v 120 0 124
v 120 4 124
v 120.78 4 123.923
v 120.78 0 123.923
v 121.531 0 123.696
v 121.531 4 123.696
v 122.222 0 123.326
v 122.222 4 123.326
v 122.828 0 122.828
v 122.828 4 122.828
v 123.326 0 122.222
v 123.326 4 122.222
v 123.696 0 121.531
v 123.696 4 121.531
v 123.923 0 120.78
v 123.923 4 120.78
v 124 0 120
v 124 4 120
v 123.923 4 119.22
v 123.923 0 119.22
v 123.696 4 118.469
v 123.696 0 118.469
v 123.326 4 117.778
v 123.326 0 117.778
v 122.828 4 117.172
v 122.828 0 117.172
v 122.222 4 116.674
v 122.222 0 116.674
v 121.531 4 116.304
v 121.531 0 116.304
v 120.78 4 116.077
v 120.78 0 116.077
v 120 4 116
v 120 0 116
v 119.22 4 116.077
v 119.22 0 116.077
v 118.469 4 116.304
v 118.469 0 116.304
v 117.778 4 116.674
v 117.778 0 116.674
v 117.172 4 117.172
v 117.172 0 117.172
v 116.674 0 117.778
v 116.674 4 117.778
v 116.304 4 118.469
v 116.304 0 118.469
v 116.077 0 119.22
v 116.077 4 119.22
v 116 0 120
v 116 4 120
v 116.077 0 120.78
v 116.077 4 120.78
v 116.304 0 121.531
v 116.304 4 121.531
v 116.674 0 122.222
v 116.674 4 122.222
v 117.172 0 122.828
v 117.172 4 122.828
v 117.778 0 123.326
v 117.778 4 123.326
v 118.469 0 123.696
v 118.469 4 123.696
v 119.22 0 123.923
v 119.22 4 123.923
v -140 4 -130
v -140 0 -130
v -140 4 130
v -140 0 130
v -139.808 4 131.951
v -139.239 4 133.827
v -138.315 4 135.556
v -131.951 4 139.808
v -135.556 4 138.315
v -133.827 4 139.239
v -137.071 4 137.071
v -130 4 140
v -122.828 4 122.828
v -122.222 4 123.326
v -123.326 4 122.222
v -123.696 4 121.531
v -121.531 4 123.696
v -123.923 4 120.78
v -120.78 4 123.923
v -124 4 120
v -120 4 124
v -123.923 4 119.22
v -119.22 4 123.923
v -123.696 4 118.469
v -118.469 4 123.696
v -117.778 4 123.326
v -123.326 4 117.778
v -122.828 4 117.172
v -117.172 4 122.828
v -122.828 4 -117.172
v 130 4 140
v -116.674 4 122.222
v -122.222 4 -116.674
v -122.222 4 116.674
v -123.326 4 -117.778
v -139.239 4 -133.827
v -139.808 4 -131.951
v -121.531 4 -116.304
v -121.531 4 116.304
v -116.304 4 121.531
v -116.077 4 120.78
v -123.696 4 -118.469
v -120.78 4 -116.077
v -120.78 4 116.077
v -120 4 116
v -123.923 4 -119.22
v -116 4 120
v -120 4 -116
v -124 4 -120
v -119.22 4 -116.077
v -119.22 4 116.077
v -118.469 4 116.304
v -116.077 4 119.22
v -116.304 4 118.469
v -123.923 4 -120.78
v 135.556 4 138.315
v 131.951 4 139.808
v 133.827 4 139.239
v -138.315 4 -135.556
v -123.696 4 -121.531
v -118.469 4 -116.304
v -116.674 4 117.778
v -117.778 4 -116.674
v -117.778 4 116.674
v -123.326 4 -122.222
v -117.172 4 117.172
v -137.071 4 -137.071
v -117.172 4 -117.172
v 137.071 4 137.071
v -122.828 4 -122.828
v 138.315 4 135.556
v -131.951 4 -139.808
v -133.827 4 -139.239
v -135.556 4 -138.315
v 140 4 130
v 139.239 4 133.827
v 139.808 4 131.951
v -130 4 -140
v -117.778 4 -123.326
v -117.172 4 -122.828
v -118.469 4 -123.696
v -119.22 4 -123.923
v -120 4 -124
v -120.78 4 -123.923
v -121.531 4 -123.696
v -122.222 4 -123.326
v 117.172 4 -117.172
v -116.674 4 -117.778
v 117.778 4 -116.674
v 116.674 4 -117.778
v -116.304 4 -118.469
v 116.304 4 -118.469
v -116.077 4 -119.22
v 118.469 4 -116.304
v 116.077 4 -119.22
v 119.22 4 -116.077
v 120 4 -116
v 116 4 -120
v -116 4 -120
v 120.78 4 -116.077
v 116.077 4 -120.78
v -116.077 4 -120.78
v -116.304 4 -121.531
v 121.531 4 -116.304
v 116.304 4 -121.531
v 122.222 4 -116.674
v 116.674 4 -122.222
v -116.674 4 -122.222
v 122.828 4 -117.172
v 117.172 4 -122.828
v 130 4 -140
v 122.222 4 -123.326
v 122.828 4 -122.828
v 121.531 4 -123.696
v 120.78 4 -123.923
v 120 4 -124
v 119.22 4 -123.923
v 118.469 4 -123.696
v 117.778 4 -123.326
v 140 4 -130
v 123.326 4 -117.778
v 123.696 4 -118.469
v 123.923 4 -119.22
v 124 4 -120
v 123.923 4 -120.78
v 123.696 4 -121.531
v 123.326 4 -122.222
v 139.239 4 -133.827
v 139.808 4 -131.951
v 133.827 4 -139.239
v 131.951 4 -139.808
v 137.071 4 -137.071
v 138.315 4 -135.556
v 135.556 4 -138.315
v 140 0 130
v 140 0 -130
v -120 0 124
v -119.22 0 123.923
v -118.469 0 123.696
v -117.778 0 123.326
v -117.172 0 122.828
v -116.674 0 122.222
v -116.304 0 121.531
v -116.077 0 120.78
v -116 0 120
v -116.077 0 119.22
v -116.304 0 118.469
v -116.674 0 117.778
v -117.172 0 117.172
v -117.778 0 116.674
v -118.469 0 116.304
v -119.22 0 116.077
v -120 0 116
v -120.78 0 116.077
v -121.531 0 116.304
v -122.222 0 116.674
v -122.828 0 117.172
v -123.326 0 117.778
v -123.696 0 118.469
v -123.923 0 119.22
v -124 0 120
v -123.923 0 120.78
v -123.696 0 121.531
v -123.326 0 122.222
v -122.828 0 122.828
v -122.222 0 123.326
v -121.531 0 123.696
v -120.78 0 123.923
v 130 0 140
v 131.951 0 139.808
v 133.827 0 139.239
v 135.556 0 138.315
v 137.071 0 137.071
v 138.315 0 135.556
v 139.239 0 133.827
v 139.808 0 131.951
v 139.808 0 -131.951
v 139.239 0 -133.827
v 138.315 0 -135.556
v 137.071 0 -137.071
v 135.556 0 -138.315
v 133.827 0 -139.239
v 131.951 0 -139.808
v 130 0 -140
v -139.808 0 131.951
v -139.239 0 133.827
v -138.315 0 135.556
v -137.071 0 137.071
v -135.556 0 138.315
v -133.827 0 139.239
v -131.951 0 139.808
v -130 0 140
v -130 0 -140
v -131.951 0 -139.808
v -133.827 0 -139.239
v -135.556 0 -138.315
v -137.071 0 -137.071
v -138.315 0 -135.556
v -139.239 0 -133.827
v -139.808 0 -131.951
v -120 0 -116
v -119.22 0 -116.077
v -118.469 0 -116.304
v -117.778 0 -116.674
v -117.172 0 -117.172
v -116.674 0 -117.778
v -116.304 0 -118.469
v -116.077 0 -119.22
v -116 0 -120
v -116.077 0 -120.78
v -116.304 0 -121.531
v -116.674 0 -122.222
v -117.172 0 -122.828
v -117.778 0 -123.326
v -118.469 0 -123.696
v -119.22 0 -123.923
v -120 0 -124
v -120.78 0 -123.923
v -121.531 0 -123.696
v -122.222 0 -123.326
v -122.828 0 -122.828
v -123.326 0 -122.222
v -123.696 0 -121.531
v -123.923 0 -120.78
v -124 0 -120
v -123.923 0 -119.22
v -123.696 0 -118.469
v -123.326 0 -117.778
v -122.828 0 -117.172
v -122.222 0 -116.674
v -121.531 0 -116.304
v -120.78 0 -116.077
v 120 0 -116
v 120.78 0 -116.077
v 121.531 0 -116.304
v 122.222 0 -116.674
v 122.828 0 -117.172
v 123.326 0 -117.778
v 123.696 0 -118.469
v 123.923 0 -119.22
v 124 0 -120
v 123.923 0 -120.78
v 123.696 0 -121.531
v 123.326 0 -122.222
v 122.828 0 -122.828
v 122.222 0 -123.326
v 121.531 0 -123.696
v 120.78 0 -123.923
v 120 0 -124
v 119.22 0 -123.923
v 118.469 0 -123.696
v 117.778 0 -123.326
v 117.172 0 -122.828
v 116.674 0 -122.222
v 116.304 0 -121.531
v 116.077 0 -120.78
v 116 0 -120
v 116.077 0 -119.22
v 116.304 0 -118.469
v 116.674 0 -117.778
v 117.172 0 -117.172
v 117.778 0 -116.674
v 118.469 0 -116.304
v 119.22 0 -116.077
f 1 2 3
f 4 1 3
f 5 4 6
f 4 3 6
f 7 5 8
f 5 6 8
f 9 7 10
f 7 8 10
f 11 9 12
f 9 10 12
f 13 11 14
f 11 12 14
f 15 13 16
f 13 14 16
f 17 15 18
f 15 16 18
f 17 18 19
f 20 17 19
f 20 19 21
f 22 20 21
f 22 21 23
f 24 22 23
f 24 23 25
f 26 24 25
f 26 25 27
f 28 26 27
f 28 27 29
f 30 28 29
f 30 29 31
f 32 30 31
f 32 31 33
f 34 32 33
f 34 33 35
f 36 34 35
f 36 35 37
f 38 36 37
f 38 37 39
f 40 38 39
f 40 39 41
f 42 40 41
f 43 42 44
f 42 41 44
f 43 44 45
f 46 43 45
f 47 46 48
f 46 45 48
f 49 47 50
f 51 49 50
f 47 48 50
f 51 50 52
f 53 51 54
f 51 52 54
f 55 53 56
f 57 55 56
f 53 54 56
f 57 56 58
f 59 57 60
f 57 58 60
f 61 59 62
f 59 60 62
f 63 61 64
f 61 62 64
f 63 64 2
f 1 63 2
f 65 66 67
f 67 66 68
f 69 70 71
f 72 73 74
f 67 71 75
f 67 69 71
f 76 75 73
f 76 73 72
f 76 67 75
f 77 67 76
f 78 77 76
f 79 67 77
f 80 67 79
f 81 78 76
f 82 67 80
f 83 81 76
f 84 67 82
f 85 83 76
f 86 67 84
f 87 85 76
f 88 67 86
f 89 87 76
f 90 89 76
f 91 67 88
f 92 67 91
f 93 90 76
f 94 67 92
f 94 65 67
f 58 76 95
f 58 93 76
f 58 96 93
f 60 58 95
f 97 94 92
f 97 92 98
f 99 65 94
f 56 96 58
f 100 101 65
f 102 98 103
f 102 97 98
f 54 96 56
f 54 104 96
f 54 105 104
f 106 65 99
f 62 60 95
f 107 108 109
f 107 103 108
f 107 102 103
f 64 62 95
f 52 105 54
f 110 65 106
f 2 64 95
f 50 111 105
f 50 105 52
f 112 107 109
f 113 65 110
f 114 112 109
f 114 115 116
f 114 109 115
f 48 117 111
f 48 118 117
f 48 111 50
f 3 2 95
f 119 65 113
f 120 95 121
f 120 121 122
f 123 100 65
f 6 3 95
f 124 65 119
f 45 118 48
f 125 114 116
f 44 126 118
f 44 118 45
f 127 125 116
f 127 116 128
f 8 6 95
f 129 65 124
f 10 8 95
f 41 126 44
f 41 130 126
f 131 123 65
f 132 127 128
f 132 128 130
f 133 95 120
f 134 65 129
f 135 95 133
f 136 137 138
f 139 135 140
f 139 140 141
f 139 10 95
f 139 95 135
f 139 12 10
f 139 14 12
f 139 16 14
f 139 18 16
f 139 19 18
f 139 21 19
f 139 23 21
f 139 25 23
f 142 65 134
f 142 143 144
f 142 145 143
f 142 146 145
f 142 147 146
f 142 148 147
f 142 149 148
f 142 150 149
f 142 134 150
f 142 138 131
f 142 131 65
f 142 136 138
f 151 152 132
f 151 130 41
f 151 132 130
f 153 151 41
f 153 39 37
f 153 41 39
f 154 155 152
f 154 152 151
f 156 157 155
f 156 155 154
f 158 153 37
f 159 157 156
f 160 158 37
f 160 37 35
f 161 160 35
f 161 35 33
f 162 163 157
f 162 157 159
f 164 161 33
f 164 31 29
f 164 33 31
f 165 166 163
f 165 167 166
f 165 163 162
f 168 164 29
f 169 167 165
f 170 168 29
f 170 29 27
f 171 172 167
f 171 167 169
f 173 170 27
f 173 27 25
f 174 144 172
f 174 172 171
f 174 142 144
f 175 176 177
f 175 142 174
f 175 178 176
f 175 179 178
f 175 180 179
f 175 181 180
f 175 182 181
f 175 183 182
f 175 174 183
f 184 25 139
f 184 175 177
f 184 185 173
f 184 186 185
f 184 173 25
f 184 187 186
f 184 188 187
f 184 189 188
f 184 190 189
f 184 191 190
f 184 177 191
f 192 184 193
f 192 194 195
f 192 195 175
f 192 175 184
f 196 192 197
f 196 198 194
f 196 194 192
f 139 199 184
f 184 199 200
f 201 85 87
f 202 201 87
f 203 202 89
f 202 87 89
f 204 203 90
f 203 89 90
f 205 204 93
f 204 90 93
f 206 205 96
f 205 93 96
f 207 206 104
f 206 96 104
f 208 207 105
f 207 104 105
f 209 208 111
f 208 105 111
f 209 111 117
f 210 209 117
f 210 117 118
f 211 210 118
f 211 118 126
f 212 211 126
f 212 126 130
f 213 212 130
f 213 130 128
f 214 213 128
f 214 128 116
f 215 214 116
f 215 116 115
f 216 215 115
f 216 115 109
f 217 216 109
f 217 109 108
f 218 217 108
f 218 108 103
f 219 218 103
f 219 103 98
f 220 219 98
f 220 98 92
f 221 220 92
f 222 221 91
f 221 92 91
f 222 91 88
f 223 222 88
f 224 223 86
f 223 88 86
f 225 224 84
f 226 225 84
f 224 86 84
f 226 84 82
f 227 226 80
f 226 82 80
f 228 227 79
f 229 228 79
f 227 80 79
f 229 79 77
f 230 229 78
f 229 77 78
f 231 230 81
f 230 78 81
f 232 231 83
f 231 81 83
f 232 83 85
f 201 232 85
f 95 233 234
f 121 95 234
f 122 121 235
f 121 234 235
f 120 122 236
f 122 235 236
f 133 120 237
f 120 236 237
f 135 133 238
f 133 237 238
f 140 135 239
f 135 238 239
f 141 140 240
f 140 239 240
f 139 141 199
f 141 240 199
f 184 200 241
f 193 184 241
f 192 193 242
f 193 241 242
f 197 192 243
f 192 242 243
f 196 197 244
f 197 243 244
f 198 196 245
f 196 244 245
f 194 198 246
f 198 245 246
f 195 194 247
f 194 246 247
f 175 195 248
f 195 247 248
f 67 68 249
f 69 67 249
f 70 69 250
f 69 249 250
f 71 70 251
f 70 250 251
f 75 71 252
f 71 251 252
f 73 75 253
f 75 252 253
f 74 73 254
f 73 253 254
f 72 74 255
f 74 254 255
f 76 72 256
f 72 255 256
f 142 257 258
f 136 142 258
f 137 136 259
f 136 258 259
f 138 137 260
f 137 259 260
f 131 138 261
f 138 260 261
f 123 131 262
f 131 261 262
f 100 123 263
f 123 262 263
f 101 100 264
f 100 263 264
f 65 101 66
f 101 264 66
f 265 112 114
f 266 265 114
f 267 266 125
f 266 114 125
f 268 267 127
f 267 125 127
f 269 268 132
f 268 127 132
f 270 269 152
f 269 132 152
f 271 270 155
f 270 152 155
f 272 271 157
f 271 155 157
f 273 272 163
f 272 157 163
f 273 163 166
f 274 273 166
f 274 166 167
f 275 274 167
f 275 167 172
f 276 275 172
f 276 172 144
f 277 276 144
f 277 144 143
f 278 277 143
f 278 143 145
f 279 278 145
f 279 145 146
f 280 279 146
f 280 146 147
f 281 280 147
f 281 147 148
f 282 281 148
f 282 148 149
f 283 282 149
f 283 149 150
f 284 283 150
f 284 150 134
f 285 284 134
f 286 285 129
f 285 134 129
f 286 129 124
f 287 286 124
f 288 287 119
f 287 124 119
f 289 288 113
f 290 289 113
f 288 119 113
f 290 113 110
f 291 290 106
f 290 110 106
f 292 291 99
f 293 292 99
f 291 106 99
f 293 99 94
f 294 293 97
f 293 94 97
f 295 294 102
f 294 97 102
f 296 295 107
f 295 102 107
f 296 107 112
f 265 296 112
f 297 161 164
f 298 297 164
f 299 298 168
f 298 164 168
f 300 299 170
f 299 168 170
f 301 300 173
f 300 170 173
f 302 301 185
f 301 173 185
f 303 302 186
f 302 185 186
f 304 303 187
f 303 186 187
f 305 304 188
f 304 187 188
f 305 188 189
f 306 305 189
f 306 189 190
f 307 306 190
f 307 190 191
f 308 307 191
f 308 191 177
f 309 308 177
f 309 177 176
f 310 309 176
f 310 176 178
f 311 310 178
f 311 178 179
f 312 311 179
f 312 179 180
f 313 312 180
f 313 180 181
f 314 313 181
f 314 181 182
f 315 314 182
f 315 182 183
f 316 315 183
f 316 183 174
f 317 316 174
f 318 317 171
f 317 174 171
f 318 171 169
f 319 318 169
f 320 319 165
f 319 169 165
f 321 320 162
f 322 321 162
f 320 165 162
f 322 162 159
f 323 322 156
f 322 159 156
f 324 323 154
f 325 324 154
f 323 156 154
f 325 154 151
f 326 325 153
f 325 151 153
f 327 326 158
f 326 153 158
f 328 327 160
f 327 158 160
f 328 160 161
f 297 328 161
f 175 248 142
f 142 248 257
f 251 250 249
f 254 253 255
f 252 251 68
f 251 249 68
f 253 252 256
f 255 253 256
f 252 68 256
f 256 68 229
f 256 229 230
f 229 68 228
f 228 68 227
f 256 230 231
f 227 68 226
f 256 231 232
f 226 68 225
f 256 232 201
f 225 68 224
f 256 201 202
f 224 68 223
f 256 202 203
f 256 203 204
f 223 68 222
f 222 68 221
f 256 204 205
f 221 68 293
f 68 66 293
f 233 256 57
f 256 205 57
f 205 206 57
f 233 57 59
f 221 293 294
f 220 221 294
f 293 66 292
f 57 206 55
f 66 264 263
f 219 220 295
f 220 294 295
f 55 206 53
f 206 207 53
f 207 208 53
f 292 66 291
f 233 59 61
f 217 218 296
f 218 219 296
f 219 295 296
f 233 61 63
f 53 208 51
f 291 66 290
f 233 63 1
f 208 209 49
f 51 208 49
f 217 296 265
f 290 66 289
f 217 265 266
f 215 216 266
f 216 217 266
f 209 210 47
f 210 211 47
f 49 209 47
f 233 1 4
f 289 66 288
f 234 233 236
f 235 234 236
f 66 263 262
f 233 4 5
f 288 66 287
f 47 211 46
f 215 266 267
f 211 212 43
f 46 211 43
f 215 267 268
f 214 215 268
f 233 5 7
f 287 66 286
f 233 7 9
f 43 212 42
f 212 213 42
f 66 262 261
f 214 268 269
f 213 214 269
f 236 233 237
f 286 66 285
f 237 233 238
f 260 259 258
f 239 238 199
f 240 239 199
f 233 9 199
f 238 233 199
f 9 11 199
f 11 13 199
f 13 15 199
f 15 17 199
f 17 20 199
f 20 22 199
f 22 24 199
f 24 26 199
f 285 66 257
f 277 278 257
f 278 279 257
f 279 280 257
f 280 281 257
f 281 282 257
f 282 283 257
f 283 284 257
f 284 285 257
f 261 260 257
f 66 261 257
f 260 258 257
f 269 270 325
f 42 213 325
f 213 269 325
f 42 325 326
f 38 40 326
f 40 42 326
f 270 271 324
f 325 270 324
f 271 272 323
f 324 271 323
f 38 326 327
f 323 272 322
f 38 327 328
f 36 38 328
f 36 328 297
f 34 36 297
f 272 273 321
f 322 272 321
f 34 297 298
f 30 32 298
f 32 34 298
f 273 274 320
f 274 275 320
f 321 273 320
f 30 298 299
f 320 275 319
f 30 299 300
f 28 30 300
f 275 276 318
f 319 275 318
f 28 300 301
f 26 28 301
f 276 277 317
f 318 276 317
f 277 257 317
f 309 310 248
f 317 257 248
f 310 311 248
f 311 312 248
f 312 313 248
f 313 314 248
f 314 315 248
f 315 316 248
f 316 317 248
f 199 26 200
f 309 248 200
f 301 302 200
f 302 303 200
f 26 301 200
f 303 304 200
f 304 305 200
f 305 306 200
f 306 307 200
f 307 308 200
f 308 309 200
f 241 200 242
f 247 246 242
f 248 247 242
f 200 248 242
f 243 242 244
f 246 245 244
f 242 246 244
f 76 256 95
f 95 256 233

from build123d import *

# Parameters (mm, degrees)
DODANIE_WYCI_GNI_CIE1_DEPTH = 4
SZKIC2_R                    = 4
WYTNIJ_WYCI_GNI_CIE1_DEPTH  = 199.030300712


with BuildPart() as part:
    # Szkic1 → Dodanie-wyciągnięcie1 (new body)
    with BuildSketch(Plane(origin=(0, 0, 0), x_dir=(1, 0, 0), z_dir=(0, 1, 0))):
        with BuildLine():
            Line((-130, -140), (130, -140))
            ThreePointArc((130, -140), (137.071067812, -137.071067812), (140, -130))
            Line((140, -130), (140, 130))
            ThreePointArc((140, 130), (137.071067812, 137.071067812), (130, 140))
            Line((130, 140), (-130, 140))
            ThreePointArc((-130, 140), (-137.071067812, 137.071067812), (-140, 130))
            Line((-140, 130), (-140, -130))
            ThreePointArc((-140, -130), (-137.071067812, -137.071067812), (-130, -140))
        make_face()
    extrude(amount=DODANIE_WYCI_GNI_CIE1_DEPTH)

    # Szkic2 → Wytnij-wyciągnięcie1 (cut, through all)
    with BuildSketch(Plane(origin=(0, 4, 0), x_dir=(1, 0, 0), z_dir=(0, 1, 0))):
        with Locations(Location((120, 120, 0), (0, 0, 270))):
            Circle(SZKIC2_R)
        with Locations(Location((120, -120, 0), (0, 0, 270))):
            Circle(SZKIC2_R)
        with Locations(Location((-120, -120, 0), (0, 0, 270))):
            Circle(SZKIC2_R)
        with Locations(Location((-120, 120, 0), (0, 0, 270))):
            Circle(SZKIC2_R)
    extrude(amount=-WYTNIJ_WYCI_GNI_CIE1_DEPTH, mode=Mode.SUBTRACT)


solid = part.part
